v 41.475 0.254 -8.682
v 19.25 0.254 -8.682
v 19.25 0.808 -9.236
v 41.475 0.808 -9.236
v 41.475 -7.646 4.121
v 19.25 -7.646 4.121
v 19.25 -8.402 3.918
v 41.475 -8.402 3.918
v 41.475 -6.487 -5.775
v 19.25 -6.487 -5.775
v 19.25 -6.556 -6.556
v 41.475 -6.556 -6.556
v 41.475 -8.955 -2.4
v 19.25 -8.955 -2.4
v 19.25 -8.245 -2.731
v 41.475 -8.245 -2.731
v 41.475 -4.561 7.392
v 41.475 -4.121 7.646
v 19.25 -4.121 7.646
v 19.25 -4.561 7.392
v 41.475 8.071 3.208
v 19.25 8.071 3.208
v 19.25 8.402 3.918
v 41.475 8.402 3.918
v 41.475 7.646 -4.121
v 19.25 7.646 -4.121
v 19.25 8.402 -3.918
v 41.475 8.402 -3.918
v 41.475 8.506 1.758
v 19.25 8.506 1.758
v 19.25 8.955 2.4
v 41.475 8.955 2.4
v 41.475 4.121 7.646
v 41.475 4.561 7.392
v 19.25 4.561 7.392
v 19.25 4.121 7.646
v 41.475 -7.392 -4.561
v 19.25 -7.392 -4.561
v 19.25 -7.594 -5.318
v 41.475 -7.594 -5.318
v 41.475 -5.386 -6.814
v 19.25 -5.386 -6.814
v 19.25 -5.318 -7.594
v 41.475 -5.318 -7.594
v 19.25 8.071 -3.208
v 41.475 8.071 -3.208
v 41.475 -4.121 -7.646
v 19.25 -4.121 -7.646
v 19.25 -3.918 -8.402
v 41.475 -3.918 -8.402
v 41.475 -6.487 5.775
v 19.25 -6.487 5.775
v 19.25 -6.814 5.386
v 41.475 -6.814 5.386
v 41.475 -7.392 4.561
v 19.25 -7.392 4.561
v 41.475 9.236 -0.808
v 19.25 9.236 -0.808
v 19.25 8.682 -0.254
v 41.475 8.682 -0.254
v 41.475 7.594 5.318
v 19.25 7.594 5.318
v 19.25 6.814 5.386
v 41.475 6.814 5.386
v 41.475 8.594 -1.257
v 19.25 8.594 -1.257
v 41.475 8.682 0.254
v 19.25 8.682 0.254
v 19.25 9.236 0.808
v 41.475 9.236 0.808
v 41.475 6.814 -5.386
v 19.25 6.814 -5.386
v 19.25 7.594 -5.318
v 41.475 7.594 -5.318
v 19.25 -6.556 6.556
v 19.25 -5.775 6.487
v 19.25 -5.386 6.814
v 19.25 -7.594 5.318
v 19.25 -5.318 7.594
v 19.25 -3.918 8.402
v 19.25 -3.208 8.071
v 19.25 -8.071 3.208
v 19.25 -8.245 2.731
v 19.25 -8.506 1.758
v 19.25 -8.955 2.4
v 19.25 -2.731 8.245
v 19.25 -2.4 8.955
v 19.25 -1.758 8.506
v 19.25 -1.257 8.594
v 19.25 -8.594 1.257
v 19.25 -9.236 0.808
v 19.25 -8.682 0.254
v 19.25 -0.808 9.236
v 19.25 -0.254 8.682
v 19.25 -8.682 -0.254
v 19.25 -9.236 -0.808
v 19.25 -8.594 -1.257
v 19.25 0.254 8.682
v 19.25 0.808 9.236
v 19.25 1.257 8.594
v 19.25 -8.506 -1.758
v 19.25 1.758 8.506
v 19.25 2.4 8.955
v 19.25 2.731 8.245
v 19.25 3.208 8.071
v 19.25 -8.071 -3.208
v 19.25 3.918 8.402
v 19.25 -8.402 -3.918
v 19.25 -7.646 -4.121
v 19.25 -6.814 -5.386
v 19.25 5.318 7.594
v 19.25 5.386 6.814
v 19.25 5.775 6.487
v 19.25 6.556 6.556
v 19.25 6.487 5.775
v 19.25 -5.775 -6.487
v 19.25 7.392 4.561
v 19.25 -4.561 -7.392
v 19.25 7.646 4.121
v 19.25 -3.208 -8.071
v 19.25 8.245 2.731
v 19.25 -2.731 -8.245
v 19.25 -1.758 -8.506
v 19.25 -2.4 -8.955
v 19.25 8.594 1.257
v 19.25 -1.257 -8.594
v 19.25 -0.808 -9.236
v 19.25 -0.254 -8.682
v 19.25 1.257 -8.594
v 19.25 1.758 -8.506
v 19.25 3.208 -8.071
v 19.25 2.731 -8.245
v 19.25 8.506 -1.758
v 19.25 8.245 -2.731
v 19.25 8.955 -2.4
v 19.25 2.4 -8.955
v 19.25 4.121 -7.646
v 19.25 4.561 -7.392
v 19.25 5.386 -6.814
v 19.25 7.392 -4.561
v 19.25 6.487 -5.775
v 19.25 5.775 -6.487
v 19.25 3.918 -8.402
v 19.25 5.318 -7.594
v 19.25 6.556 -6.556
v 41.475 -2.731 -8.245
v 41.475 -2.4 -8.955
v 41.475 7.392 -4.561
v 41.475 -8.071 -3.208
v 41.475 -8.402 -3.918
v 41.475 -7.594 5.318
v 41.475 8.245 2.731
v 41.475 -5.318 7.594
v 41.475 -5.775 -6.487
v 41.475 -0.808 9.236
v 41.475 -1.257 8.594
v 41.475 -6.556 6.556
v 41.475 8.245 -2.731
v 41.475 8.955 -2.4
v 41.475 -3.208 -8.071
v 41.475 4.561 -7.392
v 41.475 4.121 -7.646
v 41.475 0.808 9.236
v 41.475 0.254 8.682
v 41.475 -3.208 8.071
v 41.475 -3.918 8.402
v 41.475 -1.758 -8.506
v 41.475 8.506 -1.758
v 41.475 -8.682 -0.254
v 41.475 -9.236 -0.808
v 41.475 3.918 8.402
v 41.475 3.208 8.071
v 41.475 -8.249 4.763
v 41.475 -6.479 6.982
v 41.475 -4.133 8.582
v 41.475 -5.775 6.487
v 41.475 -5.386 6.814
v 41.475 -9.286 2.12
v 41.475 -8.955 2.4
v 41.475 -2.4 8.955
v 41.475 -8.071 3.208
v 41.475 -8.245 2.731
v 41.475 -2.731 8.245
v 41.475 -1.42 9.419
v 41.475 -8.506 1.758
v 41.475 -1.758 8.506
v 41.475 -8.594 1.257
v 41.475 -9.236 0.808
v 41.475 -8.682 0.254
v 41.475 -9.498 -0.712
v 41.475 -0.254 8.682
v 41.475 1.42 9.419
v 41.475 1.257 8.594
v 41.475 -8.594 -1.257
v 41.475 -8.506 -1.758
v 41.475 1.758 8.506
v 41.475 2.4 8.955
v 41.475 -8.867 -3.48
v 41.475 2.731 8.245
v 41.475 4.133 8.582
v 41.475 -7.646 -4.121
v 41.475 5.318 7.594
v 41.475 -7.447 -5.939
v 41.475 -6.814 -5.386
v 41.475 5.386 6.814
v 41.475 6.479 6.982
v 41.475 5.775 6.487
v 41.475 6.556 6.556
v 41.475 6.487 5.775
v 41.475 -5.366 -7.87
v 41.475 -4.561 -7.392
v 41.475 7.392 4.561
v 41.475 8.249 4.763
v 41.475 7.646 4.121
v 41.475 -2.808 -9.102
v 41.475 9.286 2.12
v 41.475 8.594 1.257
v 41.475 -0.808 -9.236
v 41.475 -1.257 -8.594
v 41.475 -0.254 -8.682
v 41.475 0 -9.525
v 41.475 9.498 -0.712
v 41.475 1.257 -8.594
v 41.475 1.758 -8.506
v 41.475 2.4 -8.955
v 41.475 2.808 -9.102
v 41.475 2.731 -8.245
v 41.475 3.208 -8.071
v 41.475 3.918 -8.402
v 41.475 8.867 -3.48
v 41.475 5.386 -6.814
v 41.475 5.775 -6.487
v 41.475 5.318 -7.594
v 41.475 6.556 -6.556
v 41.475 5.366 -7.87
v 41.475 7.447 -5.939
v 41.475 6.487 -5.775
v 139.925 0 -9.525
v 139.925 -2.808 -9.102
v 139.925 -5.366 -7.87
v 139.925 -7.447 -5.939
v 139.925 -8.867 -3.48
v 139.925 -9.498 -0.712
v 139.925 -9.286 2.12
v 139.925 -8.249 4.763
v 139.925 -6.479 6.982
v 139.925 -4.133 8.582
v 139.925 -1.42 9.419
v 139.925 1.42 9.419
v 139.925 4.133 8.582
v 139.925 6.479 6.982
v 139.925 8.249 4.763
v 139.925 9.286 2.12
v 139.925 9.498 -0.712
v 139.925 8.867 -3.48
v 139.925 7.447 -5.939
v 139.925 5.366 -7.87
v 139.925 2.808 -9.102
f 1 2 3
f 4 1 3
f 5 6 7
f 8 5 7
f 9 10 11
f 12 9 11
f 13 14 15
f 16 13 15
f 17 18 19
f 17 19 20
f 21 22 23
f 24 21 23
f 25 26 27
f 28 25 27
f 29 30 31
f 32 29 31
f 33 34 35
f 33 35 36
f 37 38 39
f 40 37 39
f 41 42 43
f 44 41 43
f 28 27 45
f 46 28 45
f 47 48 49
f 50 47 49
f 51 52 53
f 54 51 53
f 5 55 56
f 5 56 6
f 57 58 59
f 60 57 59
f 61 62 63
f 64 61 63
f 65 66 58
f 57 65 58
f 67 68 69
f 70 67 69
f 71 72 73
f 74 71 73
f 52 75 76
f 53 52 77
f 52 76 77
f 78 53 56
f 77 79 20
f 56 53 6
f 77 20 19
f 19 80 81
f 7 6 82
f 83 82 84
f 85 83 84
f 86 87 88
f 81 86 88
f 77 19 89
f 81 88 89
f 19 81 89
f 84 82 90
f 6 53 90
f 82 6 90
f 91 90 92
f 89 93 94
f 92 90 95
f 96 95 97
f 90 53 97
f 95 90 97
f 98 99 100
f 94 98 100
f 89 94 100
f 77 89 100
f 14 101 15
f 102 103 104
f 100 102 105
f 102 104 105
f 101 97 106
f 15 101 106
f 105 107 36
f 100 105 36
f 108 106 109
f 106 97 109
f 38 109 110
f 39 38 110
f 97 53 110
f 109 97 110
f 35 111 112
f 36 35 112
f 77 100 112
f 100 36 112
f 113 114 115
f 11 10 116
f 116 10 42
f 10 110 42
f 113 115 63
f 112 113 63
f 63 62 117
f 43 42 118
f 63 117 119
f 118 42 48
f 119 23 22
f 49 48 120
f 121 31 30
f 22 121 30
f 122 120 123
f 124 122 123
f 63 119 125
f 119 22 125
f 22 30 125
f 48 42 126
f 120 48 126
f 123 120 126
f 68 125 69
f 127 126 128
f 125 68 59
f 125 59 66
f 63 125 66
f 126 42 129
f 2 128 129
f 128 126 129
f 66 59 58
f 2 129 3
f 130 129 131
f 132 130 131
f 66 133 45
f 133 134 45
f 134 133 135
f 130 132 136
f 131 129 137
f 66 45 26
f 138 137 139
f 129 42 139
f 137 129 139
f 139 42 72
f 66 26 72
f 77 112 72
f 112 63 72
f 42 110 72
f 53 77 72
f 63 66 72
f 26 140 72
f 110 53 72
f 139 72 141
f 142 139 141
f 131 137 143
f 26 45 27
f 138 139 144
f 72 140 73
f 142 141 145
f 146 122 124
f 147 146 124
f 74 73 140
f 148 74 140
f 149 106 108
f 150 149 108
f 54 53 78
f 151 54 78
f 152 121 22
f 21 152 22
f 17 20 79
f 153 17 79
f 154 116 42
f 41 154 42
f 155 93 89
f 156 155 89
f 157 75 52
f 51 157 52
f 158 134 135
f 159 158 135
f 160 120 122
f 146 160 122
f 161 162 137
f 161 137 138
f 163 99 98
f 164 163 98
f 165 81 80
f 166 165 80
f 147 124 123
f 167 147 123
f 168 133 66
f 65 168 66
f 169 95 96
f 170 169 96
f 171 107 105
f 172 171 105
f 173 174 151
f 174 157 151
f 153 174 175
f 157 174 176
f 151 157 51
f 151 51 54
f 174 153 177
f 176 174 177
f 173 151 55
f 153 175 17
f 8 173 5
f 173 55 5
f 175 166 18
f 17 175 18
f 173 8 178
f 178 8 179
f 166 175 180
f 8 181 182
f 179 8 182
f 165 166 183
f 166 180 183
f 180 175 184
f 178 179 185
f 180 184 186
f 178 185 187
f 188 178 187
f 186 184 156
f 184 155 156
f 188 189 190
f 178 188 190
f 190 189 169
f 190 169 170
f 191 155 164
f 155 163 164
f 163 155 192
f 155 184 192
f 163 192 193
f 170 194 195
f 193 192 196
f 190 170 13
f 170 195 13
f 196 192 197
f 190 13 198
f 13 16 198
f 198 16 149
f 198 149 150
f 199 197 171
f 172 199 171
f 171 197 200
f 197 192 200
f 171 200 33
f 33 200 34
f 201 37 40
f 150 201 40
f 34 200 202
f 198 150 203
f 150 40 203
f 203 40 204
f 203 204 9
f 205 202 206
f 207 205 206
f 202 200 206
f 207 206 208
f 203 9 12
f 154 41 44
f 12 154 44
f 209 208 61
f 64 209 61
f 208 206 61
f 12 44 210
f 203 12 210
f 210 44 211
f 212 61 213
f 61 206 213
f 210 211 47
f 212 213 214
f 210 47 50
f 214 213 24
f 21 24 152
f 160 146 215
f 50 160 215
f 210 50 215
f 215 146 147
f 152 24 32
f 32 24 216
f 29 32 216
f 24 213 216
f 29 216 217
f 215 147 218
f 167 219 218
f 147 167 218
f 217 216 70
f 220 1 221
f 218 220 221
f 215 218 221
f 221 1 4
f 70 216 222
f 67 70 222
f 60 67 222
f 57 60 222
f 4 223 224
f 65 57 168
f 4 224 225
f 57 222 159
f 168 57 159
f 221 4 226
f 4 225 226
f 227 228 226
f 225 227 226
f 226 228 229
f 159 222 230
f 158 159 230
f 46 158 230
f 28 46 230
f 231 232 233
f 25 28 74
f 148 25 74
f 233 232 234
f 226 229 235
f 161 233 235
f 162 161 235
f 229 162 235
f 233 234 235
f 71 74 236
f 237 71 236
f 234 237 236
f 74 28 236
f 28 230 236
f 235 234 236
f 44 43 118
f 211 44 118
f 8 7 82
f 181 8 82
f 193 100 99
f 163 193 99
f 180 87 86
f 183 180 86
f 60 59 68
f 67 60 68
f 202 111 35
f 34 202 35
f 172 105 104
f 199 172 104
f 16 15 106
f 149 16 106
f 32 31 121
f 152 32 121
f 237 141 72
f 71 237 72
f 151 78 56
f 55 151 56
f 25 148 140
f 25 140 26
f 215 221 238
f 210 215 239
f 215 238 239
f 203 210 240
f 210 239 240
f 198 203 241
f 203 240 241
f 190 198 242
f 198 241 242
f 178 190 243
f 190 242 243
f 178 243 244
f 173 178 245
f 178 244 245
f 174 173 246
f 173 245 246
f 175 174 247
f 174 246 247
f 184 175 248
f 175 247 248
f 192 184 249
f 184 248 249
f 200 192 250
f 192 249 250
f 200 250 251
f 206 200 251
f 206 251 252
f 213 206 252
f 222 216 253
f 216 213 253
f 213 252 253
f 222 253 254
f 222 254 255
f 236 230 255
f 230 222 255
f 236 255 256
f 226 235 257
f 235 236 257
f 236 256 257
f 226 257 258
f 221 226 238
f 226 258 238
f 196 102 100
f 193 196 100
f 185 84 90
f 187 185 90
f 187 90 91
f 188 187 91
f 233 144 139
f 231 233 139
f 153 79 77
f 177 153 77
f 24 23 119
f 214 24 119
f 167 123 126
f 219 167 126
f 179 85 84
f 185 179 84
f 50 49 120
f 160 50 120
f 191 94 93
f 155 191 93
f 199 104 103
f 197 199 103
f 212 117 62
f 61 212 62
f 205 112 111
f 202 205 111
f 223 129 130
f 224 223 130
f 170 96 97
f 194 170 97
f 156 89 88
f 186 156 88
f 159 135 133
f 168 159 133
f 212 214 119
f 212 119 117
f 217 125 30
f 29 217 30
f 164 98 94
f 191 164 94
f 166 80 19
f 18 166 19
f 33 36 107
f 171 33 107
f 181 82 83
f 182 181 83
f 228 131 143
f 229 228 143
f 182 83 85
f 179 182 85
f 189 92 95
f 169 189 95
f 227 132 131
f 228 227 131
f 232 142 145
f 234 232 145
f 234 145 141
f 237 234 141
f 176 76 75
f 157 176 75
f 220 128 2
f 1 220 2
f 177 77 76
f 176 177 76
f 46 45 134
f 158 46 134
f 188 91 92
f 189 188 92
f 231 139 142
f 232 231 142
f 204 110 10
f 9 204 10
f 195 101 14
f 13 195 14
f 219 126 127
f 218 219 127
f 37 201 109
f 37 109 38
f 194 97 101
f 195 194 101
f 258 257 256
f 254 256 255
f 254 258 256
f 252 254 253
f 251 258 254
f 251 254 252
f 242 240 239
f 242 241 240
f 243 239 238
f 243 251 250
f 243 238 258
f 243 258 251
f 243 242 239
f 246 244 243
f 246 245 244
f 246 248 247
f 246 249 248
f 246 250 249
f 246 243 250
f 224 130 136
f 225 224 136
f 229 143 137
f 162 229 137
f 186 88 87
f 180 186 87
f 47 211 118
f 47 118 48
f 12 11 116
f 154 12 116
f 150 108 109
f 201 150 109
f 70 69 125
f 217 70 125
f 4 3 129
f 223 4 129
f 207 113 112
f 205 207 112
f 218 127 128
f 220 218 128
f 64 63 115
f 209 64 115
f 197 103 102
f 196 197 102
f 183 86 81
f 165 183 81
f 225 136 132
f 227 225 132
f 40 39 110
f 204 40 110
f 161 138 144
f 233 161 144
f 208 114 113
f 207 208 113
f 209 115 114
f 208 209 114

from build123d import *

# Parameters (mm, degrees)
SKETCH1_W           = 120.675
SKETCH1_H           = 1.5875
CUT_EXTRUDE2_START  = 19.25
SKETCH4_R           = 12.7
CUT_EXTRUDE2_DEPTH  = 22.225
BOSS_EXTRUDE1_START = -120.675
SKETCH5_R           = 7.9375
BOSS_EXTRUDE1_DEPTH = 120.675


with BuildPart() as part:
    # Sketch1 → Revolve1 (revolve)
    with BuildSketch(Plane(origin=(0, 0, 0), x_dir=(1, 0, 0), z_dir=(0, 1, 0))):
        with Locations((79.5875, 8.73125)):
            Rectangle(SKETCH1_W, SKETCH1_H)
    revolve(axis=Axis((157.324, 0, 0), (-1, 0, 0)))

    # Sketch4 → Cut-Extrude2 (cut)
    with BuildSketch(Plane(origin=(0, 0, 0), x_dir=(0, 0, -1), z_dir=(1, 0, 0)).offset(CUT_EXTRUDE2_START)):
        Circle(SKETCH4_R)
        Polygon((-9.235721046, 0.808020891), (-8.681700155, 0.254), (-8.681700155, -0.254), (-9.235721046, -0.808020891), (-8.593912259, -1.257420242), (-8.505698985, -1.75770258), (-8.955098336, -2.399511367), (-8.245002688, -2.730634406), (-8.071256455, -3.207998257), (-8.402379494, -3.918093905), (-7.645572882, -4.120879625), (-7.391572882, -4.56082053), (-7.594358603, -5.317627141), (-6.813836213, -5.385914002), (-6.487300108, -5.775064579), (-6.555586968, -6.555586968), (-5.775064579, -6.487300108), (-5.385914002, -6.813836213), (-5.317627141, -7.594358603), (-4.56082053, -7.391572882), (-4.120879625, -7.645572882), (-3.918093905, -8.402379494), (-3.207998257, -8.071256455), (-2.730634406, -8.245002688), (-2.399511367, -8.955098336), (-1.75770258, -8.505698985), (-1.257420242, -8.593912259), (-0.808020891, -9.235721046), (-0.254, -8.681700155), (0.254, -8.681700155), (0.808020891, -9.235721046), (1.257420242, -8.593912259), (1.75770258, -8.505698985), (2.399511367, -8.955098336), (2.730634406, -8.245002688), (3.207998257, -8.071256455), (3.918093905, -8.402379494), (4.120879625, -7.645572882), (4.56082053, -7.391572882), (5.317627141, -7.594358603), (5.385914002, -6.813836213), (5.775064579, -6.487300108), (6.555586968, -6.555586968), (6.487300108, -5.775064579), (6.813836213, -5.385914002), (7.594358603, -5.317627141), (7.391572882, -4.56082053), (7.645572882, -4.120879625), (8.402379494, -3.918093905), (8.071256455, -3.207998257), (8.245002688, -2.730634406), (8.955098336, -2.399511367), (8.505698985, -1.75770258), (8.593912259, -1.257420242), (9.235721046, -0.808020891), (8.681700155, -0.254), (8.681700155, 0.254), (9.235721046, 0.808020891), (8.593912259, 1.257420242), (8.505698985, 1.75770258), (8.955098336, 2.399511367), (8.245002688, 2.730634406), (8.071256455, 3.207998257), (8.402379494, 3.918093905), (7.645572882, 4.120879625), (7.391572882, 4.56082053), (7.594358603, 5.317627141), (6.813836213, 5.385914002), (6.487300108, 5.775064579), (6.555586968, 6.555586968), (5.775064579, 6.487300108), (5.385914002, 6.813836213), (5.317627141, 7.594358603), (4.56082053, 7.391572882), (4.120879625, 7.645572882), (3.918093905, 8.402379494), (3.207998257, 8.071256455), (2.730634406, 8.245002688), (2.399511367, 8.955098336), (1.75770258, 8.505698985), (1.257420242, 8.593912259), (0.808020891, 9.235721046), (0.254, 8.681700155), (-0.254, 8.681700155), (-0.808020891, 9.235721046), (-1.257420242, 8.593912259), (-1.75770258, 8.505698985), (-2.399511367, 8.955098336), (-2.730634406, 8.245002688), (-3.207998257, 8.071256455), (-3.918093905, 8.402379494), (-4.120879625, 7.645572882), (-4.56082053, 7.391572882), (-5.317627141, 7.594358603), (-5.385914002, 6.813836213), (-5.775064579, 6.487300108), (-6.555586968, 6.555586968), (-6.487300108, 5.775064579), (-6.813836213, 5.385914002), (-7.594358603, 5.317627141), (-7.391572882, 4.56082053), (-7.645572882, 4.120879625), (-8.402379494, 3.918093905), (-8.071256455, 3.207998257), (-8.245002688, 2.730634406), (-8.955098336, 2.399511367), (-8.505698985, 1.75770258), (-8.593912259, 1.257420242), align=None, mode=Mode.SUBTRACT)
    extrude(amount=CUT_EXTRUDE2_DEPTH, mode=Mode.SUBTRACT)

    # Sketch5 → Boss-Extrude1 (add)
    with BuildSketch(Plane(origin=(139.925, 0, 0), x_dir=(0, 0, -1), z_dir=(1, 0, 0)).offset(BOSS_EXTRUDE1_START)):
        Circle(SKETCH5_R)
    extrude(amount=BOSS_EXTRUDE1_DEPTH)


solid = part.part
